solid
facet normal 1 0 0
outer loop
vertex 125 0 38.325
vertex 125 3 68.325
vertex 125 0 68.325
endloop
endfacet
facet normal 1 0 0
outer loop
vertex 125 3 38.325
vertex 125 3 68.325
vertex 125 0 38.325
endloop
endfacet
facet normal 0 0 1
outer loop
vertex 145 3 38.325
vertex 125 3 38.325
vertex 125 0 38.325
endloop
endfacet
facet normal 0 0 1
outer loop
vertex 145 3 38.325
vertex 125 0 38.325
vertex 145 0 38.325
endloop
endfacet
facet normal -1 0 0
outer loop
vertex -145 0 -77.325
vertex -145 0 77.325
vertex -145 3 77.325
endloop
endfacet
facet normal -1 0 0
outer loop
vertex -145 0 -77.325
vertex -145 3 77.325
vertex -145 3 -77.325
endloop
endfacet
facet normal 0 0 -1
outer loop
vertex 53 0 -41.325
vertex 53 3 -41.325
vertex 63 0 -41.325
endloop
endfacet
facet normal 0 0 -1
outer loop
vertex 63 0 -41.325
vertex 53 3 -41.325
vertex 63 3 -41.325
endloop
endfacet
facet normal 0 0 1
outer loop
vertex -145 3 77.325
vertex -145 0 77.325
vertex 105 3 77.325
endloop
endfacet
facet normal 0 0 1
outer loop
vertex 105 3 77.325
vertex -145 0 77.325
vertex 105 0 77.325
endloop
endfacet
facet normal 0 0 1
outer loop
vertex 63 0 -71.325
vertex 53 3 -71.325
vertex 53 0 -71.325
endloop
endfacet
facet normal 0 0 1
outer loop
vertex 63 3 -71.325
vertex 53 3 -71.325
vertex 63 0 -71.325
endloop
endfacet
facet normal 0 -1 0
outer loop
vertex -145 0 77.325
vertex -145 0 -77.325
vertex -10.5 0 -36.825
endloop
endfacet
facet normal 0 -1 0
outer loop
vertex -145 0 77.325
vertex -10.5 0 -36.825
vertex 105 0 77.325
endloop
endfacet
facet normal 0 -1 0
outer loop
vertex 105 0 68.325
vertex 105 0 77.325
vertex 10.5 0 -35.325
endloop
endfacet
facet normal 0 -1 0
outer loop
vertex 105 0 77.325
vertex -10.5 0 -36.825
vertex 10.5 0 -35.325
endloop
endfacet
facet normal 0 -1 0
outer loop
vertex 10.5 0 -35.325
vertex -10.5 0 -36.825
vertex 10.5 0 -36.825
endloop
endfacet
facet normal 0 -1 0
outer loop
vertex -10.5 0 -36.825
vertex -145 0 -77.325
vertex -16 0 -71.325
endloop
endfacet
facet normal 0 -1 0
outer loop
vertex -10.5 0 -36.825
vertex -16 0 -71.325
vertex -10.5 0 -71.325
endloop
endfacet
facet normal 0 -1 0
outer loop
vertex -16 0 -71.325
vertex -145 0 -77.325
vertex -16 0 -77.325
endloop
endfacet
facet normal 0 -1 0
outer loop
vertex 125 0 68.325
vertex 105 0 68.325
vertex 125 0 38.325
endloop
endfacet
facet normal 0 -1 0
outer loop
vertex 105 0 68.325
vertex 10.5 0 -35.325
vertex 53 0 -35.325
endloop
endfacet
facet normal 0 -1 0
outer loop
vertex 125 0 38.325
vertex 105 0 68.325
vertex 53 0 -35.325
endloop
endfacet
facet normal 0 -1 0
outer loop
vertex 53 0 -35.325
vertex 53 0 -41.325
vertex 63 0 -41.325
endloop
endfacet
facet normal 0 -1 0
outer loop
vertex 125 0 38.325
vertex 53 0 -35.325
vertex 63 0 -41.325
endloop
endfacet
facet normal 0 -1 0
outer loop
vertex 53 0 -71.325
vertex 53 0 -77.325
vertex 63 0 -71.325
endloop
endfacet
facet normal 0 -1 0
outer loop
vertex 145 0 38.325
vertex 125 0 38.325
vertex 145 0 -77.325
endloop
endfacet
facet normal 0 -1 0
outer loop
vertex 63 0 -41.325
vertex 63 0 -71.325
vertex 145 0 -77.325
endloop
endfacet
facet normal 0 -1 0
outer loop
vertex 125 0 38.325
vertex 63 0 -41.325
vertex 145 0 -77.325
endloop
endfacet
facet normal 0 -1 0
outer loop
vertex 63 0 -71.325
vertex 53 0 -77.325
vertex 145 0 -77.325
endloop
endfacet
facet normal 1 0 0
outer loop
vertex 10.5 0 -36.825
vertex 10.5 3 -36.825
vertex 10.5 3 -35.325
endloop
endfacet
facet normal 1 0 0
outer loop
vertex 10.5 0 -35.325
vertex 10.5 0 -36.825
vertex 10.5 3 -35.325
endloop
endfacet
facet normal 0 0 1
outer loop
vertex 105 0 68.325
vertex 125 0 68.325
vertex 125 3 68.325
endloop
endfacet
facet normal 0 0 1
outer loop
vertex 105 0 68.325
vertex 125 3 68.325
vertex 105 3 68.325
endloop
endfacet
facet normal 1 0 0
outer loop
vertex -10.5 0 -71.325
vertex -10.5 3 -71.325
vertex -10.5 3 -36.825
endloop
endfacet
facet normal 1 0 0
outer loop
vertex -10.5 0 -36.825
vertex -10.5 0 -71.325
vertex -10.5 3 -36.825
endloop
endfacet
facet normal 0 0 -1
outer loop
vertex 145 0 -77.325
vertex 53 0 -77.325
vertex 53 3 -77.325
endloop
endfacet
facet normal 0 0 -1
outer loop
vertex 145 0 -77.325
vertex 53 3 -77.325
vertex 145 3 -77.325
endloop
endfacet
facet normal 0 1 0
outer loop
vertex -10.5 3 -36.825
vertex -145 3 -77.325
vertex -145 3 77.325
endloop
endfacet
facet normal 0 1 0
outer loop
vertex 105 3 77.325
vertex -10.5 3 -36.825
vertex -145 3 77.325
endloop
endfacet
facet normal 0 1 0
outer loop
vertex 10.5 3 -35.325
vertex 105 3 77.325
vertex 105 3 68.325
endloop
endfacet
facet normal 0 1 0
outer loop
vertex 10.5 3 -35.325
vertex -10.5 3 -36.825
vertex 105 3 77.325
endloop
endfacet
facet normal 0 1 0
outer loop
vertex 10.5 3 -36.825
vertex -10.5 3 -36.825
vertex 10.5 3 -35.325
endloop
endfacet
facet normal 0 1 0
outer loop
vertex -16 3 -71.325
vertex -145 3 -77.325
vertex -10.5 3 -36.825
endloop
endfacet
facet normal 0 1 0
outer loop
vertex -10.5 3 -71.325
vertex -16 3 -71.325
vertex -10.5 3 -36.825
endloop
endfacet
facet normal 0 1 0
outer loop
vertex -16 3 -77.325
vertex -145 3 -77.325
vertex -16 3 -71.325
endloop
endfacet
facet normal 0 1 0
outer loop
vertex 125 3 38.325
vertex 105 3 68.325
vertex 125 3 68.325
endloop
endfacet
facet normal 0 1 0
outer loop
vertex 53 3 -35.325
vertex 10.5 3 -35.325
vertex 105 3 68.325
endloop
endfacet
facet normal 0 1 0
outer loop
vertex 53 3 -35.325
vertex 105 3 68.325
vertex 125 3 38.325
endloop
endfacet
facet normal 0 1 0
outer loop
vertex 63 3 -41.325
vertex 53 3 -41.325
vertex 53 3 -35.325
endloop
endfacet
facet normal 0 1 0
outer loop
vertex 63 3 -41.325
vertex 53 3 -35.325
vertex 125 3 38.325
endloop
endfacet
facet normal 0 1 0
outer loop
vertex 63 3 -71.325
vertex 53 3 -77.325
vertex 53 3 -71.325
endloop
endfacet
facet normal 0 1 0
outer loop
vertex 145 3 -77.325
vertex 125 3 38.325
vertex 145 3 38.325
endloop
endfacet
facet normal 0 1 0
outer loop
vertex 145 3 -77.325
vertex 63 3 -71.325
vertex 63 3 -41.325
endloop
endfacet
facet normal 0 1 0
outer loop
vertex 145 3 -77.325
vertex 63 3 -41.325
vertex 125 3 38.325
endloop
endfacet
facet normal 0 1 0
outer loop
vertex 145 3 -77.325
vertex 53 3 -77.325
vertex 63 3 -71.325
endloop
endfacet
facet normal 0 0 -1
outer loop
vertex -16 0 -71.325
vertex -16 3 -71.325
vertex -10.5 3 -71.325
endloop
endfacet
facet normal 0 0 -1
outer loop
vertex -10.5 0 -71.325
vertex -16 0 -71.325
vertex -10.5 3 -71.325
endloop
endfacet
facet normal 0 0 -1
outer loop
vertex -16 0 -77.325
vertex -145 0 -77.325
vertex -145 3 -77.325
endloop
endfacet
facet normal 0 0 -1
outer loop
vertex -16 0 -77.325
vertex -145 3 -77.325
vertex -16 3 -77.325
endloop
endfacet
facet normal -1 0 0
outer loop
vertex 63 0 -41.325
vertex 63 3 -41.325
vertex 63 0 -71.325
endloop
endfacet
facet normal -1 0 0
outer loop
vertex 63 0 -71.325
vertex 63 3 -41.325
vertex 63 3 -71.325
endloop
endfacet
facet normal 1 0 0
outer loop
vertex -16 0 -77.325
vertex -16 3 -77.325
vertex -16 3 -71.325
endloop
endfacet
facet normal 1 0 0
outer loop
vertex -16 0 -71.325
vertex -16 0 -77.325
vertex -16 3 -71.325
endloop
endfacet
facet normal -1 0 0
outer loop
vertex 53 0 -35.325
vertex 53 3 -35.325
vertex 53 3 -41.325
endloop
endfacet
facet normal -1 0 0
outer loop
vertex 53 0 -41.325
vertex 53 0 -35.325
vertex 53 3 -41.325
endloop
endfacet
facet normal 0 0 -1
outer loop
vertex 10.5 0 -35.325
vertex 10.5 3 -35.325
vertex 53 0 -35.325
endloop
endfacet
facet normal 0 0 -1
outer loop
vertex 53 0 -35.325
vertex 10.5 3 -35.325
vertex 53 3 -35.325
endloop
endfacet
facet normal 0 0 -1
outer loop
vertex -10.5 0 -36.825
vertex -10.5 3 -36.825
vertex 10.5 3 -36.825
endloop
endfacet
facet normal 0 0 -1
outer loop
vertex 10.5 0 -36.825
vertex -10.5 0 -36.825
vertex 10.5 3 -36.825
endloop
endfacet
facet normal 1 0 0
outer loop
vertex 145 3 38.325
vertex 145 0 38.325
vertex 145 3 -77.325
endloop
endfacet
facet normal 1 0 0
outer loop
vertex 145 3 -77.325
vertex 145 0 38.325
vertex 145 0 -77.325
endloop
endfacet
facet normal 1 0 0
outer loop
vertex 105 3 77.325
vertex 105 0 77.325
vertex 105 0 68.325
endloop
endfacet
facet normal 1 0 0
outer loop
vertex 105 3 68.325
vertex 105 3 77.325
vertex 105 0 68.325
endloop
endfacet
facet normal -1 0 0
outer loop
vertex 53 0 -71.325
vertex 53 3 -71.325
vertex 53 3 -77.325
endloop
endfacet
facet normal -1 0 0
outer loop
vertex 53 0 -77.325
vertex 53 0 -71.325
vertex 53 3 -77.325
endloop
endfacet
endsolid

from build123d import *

# Parameters (mm, degrees)
SKETCH1_W           = 290
SKETCH1_H           = 154.65
BOSS_EXTRUDE1_DEPTH = 3
CUT_EXTRUDE1_DEPTH  = 165.356793669
SKETCH3_W           = 10
SKETCH3_H           = 15
CUT_EXTRUDE2_DEPTH  = 3
SKETCH5_W           = 40
SKETCH5_H           = 9
CUT_EXTRUDE3_DEPTH  = 3
SKETCH6_W           = 20
SKETCH6_H           = 30
CUT_EXTRUDE4_DEPTH  = 3


with BuildPart() as part:
    # Sketch1 → Boss-Extrude1 (new body)
    with BuildSketch(Plane(origin=(0, 0, 0), x_dir=(1, 0, 0), z_dir=(0, 1, 0))):
        Rectangle(SKETCH1_W, SKETCH1_H)
    extrude(amount=BOSS_EXTRUDE1_DEPTH)

    # Sketch2 → Cut-Extrude1 (cut, through all)
    with BuildSketch(Plane(origin=(0, 3, 0), x_dir=(1, 0, 0), z_dir=(0, 1, 0))):
        Polygon((53, 77.325), (-16, 77.325), (-16, 71.325), (-10.5, 71.325), (-10.5, 36.825), (10.5, 36.825), (10.5, 35.325), (19.5, 35.325), (39.5, 35.325), (53, 35.325), align=None)
    extrude(amount=-CUT_EXTRUDE1_DEPTH, mode=Mode.SUBTRACT)

    # Sketch3 → Cut-Extrude2 (cut)
    with BuildSketch(Plane(origin=(0, 3, 0), x_dir=(1, 0, 0), z_dir=(0, 1, 0))):
        with Locations((58, 63.825)):
            Rectangle(SKETCH3_W, SKETCH3_H)
        with Locations((58, 48.825)):
            Rectangle(SKETCH3_W, SKETCH3_H)
    extrude(amount=-CUT_EXTRUDE2_DEPTH, mode=Mode.SUBTRACT)

    # Sketch5 → Cut-Extrude3 (cut)
    with BuildSketch(Plane(origin=(0, 0, 0), x_dir=(-1, 0, 0), z_dir=(0, -1, 0))):
        with Locations((-125, -72.825)):
            Rectangle(SKETCH5_W, SKETCH5_H)
    extrude(amount=-CUT_EXTRUDE3_DEPTH, mode=Mode.SUBTRACT)

    # Sketch6 → Cut-Extrude4 (cut)
    with BuildSketch(Plane(origin=(0, 3, 0), x_dir=(1, 0, 0), z_dir=(0, 1, 0))):
        with Locations((135, -53.325)):
            Rectangle(SKETCH6_W, SKETCH6_H)
    extrude(amount=-CUT_EXTRUDE4_DEPTH, mode=Mode.SUBTRACT)


solid = part.part
